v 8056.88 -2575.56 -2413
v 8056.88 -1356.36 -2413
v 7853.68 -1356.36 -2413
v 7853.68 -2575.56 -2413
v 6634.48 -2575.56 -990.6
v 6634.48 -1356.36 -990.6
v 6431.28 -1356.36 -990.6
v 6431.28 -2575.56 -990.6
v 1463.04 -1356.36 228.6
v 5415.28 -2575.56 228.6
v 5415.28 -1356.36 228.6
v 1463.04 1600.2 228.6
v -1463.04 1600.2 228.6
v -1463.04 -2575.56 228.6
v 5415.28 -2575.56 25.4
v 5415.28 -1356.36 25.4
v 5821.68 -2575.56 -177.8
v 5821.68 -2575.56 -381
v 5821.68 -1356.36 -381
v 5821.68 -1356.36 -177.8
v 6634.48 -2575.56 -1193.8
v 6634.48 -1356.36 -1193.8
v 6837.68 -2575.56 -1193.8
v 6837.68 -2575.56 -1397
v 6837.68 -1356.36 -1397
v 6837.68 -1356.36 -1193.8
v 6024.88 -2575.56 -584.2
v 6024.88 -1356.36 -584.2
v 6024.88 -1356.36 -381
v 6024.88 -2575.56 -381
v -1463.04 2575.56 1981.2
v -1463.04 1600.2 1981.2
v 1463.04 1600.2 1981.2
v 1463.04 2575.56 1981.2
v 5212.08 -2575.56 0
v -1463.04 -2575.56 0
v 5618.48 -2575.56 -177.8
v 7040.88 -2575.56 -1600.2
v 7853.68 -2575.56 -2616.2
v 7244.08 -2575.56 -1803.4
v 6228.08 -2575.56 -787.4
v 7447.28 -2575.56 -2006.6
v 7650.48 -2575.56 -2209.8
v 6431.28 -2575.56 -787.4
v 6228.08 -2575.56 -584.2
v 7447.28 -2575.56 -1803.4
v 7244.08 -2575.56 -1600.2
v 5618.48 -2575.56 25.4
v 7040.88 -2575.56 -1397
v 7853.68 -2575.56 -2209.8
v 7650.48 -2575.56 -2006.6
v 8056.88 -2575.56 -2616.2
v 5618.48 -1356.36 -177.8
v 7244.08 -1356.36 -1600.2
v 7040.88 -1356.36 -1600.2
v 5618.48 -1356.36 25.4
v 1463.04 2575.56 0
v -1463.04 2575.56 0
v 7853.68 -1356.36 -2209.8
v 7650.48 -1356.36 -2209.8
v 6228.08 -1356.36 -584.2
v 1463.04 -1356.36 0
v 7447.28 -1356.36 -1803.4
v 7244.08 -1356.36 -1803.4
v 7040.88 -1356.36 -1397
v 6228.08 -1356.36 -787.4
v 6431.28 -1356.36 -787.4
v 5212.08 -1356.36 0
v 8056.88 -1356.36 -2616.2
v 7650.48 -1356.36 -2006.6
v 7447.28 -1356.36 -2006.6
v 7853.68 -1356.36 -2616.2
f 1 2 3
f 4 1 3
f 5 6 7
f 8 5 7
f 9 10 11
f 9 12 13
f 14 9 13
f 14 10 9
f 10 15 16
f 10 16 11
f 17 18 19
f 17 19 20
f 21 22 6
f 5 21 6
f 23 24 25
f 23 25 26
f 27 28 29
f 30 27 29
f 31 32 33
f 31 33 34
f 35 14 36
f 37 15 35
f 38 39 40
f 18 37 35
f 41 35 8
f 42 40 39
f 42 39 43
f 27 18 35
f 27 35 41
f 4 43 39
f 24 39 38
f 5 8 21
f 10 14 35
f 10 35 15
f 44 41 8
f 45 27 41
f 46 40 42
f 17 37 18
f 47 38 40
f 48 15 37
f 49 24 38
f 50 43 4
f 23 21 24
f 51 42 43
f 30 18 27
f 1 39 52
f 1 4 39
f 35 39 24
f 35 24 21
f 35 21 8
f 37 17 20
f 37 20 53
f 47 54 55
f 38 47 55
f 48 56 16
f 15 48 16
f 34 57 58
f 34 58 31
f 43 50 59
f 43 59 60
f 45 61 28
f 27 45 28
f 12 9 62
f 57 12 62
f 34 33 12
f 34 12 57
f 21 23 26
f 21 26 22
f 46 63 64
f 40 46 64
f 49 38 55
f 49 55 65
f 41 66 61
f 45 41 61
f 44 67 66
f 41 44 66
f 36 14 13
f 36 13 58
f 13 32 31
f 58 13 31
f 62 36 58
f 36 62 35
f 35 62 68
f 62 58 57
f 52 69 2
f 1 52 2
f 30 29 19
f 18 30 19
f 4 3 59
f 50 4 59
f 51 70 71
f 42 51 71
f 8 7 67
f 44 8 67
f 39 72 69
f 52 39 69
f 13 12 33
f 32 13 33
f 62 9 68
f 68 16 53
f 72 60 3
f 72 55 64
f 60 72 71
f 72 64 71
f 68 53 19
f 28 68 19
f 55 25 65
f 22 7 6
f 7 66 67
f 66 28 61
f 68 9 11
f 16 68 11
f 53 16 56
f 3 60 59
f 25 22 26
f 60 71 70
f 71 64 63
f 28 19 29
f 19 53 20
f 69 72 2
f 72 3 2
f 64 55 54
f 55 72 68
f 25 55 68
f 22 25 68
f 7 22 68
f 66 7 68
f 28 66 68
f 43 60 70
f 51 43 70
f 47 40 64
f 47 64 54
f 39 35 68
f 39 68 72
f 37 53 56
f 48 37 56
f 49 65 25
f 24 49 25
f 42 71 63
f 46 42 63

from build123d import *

# Parameters (mm, degrees)
F1_DEPTH = 228.6
F3_DEPTH = 1219.2
F4_W     = 975.36
F4_H     = 1752.6
F5_DEPTH = 2926.08


with BuildPart() as f1:
    # F0 (on Top) → F1 (new body)
    with BuildSketch(Plane.XY):
        Polygon((-1463.04, -2575.56), (1463.04, -2575.56), (5212.08, -2575.56), (5212.08, -1356.36), (1463.04, -1356.36), (1463.04, 2575.56), (-1463.04, 2575.56), align=None)
    extrude(amount=F1_DEPTH)

    # F2 (on face) → F3 (join, through all)
    with BuildSketch(Plane.XZ.offset(2575.56)):
        Polygon((5415.28, 228.6), (5212.08, 228.6), (5212.08, 0), (7853.68, -2616.2), (8056.88, -2616.2), (8056.88, -2413), (7853.68, -2413), (7853.68, -2209.8), (7650.48, -2209.8), (7650.48, -2006.6), (7447.28, -2006.6), (7447.28, -1803.4), (7244.08, -1803.4), (7244.08, -1600.2), (7040.88, -1600.2), (7040.88, -1397), (6837.68, -1397), (6837.68, -1193.8), (6634.48, -1193.8), (6634.48, -990.6), (6431.28, -990.6), (6431.28, -787.4), (6228.08, -787.4), (6228.08, -584.2), (6024.88, -584.2), (6024.88, -381), (5821.68, -381), (5821.68, -177.8), (5618.48, -177.8), (5618.48, 25.4), (5415.28, 25.4), align=None)
    extrude(amount=-F3_DEPTH)

    # F4 (on face) → F5 (join, through all)
    with BuildSketch(Plane.YZ.offset(1463.04)):
        with Locations((2087.88, 1104.9)):
            Rectangle(F4_W, F4_H)
    extrude(amount=-F5_DEPTH)


solid = f1.part
